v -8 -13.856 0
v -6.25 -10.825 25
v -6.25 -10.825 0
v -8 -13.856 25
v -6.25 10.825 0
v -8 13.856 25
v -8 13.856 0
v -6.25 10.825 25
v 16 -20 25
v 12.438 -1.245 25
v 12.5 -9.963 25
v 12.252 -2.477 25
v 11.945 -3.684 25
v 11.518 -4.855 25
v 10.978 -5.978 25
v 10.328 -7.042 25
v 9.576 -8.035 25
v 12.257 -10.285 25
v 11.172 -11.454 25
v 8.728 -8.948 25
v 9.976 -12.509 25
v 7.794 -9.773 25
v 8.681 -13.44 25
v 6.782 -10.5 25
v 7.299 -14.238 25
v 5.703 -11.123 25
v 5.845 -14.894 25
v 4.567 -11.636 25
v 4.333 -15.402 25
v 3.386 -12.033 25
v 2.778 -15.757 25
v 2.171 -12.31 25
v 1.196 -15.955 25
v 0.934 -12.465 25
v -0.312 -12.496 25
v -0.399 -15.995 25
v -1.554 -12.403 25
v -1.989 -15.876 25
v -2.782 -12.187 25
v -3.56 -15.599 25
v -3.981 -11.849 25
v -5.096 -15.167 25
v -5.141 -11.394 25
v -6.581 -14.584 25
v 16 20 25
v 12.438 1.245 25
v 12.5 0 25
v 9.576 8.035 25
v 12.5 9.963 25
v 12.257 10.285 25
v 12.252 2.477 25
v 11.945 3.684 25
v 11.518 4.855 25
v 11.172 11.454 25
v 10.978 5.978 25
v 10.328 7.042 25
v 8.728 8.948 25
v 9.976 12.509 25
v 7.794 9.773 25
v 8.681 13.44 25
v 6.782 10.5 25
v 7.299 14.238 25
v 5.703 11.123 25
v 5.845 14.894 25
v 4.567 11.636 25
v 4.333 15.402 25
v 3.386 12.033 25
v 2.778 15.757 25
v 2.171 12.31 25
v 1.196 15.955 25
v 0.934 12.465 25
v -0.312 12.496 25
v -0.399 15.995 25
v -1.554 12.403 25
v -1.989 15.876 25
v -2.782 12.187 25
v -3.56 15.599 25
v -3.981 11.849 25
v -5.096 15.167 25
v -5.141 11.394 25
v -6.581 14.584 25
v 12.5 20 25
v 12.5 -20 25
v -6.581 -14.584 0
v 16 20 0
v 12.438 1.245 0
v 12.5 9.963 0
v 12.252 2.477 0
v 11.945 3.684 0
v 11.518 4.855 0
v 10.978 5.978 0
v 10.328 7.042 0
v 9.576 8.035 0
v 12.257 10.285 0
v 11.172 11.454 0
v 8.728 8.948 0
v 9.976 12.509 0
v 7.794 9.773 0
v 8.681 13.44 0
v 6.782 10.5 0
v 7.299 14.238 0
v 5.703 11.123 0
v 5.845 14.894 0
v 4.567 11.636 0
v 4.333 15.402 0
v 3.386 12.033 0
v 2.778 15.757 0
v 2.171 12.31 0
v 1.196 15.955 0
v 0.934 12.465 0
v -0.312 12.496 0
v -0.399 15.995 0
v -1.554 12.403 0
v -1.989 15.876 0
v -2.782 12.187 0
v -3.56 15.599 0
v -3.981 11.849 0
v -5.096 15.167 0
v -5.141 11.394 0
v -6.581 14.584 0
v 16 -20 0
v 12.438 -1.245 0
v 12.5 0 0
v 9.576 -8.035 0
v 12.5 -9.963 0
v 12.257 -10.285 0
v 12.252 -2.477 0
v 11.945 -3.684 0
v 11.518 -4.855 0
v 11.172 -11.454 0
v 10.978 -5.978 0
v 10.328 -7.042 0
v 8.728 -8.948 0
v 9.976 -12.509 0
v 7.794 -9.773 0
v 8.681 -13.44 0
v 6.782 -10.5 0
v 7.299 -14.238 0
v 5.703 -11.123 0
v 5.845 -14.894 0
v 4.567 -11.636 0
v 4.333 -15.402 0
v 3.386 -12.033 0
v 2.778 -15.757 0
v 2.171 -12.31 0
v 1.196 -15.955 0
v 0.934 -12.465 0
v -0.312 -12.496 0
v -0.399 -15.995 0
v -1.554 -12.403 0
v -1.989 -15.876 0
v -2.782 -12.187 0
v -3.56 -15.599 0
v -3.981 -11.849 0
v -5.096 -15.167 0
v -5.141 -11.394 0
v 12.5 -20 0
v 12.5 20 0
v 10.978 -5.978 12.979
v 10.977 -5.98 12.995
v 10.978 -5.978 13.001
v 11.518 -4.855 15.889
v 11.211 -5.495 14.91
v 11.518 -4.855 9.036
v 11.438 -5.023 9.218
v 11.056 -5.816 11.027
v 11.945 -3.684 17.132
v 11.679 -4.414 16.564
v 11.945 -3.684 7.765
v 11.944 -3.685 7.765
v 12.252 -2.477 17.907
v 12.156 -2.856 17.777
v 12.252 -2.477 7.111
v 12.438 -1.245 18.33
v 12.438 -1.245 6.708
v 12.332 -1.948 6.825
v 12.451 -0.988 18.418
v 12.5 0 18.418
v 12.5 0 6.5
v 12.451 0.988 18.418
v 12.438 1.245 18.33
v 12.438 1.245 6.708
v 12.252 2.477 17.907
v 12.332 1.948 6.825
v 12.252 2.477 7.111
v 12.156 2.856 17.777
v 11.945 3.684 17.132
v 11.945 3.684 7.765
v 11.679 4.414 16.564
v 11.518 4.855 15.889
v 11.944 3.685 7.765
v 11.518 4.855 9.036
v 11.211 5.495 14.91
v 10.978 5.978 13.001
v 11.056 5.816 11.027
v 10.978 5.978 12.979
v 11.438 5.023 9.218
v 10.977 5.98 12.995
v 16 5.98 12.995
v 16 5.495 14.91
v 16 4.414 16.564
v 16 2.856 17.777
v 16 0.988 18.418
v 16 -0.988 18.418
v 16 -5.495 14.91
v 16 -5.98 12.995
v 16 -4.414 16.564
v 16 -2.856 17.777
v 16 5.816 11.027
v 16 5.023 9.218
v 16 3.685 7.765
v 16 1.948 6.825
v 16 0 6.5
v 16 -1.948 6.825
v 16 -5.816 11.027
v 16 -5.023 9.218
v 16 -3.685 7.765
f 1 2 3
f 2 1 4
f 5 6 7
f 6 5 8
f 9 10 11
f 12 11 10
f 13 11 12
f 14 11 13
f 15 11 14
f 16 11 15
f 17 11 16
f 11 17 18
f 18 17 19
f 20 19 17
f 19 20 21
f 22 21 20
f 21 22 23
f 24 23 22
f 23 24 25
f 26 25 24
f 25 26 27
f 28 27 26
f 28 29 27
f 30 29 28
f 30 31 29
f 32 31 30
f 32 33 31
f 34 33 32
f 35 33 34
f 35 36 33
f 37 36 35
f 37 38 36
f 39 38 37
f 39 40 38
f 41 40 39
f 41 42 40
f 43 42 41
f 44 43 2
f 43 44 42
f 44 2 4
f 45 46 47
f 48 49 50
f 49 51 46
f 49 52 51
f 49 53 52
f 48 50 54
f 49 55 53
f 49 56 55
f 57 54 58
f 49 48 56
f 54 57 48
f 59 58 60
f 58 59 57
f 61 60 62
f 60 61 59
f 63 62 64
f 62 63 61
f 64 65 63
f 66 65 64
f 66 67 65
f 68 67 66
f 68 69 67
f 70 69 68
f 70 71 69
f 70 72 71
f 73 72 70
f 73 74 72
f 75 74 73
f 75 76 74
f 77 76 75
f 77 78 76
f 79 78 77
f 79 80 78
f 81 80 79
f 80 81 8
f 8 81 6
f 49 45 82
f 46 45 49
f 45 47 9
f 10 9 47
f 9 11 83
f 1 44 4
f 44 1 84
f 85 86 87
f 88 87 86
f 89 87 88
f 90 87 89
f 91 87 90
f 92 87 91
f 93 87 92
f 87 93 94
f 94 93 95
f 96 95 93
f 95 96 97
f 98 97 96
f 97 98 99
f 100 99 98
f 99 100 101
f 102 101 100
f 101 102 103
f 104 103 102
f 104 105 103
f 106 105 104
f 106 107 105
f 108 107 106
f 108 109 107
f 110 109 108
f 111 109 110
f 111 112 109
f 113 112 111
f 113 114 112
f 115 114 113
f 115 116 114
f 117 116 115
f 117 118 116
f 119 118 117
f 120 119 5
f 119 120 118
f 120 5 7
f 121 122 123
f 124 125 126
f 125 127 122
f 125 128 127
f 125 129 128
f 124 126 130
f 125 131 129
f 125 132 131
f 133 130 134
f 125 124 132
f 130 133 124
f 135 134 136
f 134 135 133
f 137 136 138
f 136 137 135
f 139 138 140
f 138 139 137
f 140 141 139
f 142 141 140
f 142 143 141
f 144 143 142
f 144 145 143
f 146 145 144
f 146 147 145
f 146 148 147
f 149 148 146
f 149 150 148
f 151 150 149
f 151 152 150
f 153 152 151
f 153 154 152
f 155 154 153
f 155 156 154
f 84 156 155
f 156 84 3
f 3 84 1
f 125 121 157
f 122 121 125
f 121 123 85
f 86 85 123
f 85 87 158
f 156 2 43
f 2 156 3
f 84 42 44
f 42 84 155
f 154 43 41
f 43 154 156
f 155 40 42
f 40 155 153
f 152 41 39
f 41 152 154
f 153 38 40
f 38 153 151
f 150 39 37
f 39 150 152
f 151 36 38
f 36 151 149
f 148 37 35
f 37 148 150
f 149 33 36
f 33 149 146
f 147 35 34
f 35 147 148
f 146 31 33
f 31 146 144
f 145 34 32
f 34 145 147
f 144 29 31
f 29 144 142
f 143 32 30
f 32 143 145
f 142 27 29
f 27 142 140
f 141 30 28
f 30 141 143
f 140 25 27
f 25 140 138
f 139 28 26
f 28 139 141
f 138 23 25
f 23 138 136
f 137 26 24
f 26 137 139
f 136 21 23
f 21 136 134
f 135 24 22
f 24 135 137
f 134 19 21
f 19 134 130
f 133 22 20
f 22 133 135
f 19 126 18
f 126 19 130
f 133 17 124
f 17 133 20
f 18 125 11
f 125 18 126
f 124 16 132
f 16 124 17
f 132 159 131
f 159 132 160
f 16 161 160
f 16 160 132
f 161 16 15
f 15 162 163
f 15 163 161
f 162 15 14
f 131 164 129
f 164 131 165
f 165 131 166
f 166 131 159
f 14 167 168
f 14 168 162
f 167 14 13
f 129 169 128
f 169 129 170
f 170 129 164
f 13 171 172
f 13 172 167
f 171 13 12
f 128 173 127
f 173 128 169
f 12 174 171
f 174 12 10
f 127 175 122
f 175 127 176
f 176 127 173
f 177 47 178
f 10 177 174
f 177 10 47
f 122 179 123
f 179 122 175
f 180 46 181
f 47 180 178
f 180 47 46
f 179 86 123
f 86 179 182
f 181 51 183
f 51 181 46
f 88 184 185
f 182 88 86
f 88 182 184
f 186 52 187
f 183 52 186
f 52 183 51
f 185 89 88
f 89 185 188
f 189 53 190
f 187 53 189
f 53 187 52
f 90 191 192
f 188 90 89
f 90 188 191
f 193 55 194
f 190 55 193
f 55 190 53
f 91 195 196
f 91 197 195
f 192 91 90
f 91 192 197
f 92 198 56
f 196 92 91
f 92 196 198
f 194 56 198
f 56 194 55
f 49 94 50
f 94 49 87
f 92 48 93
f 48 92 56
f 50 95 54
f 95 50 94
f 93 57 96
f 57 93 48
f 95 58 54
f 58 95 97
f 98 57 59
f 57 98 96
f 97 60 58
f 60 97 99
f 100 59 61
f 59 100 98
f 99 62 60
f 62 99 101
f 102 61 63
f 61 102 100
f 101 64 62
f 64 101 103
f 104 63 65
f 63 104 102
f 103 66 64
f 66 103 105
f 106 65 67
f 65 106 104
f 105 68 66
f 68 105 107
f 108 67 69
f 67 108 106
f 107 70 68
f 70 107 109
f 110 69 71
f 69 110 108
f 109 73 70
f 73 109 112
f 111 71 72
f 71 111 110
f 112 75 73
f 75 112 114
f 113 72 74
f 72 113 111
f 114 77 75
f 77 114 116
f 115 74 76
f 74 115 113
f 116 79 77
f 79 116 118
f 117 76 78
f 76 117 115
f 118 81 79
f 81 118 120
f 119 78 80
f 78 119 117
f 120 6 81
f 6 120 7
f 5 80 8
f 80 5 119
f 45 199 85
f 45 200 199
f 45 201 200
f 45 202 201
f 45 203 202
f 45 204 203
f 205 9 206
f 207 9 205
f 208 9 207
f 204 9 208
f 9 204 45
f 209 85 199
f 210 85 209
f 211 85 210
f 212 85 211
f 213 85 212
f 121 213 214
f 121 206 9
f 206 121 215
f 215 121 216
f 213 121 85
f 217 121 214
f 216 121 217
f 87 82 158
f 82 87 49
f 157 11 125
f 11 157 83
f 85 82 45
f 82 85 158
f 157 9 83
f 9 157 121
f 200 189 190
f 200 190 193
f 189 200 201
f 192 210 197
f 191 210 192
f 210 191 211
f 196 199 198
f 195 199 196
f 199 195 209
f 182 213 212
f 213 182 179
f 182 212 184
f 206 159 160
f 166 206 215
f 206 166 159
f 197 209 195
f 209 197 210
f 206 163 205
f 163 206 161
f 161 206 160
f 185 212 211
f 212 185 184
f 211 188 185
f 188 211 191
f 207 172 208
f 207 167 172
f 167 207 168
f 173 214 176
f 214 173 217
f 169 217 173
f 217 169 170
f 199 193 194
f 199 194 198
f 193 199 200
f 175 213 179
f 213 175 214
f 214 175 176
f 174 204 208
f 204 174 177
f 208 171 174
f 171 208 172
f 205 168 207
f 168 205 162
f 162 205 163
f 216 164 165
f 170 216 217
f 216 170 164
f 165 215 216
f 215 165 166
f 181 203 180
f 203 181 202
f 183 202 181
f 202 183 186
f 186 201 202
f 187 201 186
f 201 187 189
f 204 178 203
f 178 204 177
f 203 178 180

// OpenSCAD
BAR_RADIUS = 25 / 2;
CLAMP_THICKNESS = 3.5;
LENGTH = 25;
WRAP_DEG = 240;
NUB_RADIUS = 12 / 2;

module main() {
  difference() {
    union() {
      rotate(-WRAP_DEG/2) rotate_extrude(convexity = 10, angle=WRAP_DEG, $fn=64)
        translate([BAR_RADIUS, 0, 0])
          square([CLAMP_THICKNESS, LENGTH]);
      translate([BAR_RADIUS, -20, 0]) cube([CLAMP_THICKNESS, 40, LENGTH]);
    }
    translate([0, 0, LENGTH/2]) rotate([0, 90, 0]) cylinder(CLAMP_THICKNESS+BAR_RADIUS, r=NUB_RADIUS);
  }
}

main();
